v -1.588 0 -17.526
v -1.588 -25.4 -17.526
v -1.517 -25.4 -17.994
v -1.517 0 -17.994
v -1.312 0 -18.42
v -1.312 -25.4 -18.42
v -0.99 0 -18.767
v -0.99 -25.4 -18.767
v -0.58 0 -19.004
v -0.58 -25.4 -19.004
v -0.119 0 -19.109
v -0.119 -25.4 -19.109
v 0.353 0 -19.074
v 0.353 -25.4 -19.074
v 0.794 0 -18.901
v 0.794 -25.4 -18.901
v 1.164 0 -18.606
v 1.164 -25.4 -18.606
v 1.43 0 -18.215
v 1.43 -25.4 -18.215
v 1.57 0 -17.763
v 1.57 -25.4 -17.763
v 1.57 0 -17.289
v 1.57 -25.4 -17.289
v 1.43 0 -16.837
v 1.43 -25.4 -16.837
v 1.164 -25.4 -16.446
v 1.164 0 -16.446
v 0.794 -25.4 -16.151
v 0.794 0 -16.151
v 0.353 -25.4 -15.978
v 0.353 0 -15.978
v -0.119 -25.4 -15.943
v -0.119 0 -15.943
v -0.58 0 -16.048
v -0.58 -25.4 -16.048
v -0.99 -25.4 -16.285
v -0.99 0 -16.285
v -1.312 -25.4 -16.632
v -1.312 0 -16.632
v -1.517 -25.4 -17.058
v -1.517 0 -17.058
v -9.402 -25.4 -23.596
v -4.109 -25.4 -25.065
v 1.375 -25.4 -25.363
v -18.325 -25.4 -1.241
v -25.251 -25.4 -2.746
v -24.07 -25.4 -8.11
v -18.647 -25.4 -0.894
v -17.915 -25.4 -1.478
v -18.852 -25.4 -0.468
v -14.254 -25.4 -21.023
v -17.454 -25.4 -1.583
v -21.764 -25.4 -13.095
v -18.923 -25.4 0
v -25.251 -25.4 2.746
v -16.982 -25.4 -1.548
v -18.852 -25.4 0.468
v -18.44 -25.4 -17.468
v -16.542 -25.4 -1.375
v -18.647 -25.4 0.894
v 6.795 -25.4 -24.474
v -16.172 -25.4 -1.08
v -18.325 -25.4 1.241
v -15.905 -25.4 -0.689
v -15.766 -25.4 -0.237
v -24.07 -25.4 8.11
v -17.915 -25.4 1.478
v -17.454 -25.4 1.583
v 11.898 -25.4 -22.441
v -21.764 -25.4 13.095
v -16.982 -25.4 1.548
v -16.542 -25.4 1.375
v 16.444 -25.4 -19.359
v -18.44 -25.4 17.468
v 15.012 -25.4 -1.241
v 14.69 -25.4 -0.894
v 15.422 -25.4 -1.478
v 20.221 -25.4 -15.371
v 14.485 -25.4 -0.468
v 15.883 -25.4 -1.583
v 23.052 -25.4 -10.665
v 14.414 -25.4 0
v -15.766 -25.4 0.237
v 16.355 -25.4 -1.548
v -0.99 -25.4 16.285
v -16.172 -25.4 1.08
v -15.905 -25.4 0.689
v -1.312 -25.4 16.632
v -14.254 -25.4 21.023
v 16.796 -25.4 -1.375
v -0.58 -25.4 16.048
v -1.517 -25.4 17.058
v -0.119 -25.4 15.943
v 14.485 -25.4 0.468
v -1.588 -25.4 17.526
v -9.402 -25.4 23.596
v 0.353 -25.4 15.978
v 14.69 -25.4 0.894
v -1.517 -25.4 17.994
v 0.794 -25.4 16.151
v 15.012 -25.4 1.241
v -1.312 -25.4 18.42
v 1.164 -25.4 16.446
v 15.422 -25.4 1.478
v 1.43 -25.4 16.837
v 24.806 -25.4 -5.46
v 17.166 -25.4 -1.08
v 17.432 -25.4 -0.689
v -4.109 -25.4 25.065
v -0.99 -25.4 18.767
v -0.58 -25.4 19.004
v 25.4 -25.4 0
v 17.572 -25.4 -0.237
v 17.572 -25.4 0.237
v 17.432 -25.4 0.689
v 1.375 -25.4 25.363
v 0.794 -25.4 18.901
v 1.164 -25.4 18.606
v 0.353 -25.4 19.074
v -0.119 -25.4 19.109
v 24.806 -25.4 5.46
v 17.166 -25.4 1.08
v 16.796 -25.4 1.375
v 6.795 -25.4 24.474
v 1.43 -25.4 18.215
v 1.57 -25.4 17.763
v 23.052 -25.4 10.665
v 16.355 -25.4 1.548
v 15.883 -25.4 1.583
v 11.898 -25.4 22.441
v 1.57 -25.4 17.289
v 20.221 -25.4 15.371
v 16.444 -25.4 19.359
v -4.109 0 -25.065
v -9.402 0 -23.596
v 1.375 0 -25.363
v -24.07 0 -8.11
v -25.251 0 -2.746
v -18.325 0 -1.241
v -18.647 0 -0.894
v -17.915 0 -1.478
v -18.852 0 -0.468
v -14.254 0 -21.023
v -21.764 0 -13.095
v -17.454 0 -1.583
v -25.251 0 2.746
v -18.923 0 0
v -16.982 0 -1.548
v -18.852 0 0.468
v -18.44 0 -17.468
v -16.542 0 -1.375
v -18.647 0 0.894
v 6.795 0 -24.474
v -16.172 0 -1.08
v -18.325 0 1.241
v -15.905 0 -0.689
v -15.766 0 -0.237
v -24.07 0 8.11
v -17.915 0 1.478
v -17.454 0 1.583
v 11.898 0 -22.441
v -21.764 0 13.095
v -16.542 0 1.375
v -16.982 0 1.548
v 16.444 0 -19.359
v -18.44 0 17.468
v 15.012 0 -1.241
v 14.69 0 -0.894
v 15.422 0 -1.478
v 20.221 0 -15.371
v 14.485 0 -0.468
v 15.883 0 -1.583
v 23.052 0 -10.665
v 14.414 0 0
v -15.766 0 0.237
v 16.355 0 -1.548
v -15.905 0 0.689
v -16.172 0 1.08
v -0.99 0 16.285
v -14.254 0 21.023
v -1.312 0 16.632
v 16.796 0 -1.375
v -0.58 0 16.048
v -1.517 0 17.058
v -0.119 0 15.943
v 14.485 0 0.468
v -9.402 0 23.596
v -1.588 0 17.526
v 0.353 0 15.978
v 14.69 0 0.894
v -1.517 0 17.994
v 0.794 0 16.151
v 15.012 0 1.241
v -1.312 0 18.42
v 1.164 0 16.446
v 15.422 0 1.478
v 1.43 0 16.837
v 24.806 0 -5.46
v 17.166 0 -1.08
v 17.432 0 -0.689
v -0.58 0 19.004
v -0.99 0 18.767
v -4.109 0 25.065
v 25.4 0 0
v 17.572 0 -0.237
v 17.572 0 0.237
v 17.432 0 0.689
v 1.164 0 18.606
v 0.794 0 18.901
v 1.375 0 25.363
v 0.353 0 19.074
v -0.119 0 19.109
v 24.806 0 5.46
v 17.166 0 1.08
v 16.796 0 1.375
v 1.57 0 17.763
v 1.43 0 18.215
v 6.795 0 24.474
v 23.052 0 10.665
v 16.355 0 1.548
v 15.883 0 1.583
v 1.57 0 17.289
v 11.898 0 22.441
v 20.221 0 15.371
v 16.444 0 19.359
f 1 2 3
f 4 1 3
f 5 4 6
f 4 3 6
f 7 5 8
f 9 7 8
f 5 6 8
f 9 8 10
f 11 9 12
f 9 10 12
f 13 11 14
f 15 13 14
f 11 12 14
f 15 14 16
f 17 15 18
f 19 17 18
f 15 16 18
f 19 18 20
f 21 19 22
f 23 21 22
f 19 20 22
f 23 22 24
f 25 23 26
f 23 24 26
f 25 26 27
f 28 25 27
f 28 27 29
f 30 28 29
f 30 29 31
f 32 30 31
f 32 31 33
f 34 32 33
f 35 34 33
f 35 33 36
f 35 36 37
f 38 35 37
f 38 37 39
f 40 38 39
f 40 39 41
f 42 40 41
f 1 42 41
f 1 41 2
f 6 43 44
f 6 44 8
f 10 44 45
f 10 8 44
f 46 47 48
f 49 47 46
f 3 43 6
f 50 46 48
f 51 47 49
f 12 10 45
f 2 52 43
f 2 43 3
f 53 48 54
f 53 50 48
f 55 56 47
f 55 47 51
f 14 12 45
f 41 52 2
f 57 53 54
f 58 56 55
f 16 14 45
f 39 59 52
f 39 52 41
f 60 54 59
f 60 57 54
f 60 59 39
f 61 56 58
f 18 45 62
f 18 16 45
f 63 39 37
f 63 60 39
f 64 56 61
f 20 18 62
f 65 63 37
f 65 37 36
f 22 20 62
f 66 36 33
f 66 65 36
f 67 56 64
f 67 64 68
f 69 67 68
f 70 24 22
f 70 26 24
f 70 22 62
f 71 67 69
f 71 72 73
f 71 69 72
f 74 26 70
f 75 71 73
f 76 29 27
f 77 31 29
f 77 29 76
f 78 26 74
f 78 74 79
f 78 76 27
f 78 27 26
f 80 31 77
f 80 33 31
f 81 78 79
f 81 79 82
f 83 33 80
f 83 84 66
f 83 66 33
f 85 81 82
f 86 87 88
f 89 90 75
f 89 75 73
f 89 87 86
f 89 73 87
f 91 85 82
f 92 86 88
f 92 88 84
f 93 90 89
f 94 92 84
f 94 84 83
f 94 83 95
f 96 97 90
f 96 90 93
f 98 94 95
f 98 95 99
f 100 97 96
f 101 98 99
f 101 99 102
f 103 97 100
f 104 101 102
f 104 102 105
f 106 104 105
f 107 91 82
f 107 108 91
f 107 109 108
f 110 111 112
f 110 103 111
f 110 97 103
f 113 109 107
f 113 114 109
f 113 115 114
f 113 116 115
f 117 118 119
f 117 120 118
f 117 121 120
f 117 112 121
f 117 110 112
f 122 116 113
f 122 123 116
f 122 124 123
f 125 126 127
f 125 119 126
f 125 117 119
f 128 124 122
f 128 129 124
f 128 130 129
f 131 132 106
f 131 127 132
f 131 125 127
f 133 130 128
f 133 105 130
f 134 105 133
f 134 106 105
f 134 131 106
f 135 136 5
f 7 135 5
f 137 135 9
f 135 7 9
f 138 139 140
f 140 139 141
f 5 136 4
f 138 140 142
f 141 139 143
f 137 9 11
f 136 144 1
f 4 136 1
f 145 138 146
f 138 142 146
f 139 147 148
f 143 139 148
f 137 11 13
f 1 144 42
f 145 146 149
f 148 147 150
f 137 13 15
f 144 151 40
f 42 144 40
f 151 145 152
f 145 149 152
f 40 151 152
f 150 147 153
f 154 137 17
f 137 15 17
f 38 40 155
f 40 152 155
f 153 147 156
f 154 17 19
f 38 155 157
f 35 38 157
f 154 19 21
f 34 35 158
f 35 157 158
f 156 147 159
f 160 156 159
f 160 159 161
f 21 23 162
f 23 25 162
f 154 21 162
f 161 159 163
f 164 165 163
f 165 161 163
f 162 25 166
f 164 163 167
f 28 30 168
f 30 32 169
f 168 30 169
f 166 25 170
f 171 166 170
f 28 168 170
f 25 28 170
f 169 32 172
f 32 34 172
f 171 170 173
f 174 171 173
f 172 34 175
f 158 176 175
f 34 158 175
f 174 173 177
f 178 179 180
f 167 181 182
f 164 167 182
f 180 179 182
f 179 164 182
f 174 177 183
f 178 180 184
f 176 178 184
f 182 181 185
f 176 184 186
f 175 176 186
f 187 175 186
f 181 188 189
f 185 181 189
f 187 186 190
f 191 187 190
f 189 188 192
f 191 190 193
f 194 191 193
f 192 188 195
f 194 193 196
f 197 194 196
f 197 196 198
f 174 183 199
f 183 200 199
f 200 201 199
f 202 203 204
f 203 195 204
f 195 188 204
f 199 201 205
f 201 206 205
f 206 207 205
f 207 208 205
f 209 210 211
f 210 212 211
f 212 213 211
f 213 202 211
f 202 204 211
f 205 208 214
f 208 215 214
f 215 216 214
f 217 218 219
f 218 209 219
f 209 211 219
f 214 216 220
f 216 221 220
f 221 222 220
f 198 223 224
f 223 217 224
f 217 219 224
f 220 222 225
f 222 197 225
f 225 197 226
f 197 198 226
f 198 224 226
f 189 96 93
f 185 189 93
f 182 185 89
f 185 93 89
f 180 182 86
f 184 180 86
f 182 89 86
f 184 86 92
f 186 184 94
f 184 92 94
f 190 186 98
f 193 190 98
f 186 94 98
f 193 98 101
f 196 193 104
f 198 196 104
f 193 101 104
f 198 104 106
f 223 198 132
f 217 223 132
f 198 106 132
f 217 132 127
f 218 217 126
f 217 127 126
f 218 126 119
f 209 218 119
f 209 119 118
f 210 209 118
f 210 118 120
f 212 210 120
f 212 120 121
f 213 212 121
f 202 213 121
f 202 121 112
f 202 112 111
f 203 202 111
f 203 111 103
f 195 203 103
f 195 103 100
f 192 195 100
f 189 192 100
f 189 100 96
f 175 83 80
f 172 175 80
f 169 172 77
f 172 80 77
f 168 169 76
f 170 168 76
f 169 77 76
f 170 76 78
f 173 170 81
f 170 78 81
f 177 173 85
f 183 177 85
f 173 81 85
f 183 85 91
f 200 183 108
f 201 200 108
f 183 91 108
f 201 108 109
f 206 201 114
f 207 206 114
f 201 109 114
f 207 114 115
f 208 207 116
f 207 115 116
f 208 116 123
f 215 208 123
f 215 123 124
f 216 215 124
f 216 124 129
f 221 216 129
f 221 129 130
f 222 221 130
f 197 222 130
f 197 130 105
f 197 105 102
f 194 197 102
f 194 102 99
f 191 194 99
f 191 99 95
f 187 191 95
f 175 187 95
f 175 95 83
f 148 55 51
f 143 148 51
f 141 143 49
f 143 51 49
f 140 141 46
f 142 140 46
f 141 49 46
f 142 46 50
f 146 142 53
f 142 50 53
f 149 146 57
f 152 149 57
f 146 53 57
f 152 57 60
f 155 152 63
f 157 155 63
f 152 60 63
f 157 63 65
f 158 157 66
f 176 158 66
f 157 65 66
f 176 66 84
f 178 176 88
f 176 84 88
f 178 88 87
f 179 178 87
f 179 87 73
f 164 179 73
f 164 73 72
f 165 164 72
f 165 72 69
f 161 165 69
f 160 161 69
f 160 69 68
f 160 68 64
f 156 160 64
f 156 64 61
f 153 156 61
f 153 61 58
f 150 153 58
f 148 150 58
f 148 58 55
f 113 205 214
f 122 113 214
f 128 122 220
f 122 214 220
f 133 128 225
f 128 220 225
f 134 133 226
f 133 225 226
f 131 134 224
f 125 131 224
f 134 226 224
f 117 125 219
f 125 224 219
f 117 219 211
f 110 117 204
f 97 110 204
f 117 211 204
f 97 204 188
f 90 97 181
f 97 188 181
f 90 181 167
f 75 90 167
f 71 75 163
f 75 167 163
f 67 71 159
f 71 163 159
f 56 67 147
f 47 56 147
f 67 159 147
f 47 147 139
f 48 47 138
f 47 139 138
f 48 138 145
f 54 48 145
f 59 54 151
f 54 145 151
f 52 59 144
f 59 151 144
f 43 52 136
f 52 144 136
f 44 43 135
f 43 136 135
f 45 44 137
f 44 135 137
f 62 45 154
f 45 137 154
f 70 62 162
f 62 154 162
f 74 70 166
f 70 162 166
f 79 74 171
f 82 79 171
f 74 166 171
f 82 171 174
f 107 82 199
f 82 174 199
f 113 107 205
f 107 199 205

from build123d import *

# Parameters (mm, degrees)
F0_R     = 25.4
F0_R_2   = 22.225
F2_DEPTH = 25.4
F3_D     = 3.175


with BuildPart() as f2:
    # F0 (on Front) → F2 (new body)
    with BuildSketch(Plane.XZ):
        Circle(F0_R)
        Circle(F0_R_2, mode=Mode.SUBTRACT)
        Circle(F0_R_2)
    extrude(amount=F2_DEPTH)

    # F3 (through all)
    with Locations(Plane(origin=(0, 0, 0), x_dir=(1, 0, 0), z_dir=(0, 1, 0))):
        with Locations((0, 17.526003), (16.001999, 0), (0, -17.525999), (-17.335502, 0)):
            Hole(F3_D / 2)


solid = f2.part
